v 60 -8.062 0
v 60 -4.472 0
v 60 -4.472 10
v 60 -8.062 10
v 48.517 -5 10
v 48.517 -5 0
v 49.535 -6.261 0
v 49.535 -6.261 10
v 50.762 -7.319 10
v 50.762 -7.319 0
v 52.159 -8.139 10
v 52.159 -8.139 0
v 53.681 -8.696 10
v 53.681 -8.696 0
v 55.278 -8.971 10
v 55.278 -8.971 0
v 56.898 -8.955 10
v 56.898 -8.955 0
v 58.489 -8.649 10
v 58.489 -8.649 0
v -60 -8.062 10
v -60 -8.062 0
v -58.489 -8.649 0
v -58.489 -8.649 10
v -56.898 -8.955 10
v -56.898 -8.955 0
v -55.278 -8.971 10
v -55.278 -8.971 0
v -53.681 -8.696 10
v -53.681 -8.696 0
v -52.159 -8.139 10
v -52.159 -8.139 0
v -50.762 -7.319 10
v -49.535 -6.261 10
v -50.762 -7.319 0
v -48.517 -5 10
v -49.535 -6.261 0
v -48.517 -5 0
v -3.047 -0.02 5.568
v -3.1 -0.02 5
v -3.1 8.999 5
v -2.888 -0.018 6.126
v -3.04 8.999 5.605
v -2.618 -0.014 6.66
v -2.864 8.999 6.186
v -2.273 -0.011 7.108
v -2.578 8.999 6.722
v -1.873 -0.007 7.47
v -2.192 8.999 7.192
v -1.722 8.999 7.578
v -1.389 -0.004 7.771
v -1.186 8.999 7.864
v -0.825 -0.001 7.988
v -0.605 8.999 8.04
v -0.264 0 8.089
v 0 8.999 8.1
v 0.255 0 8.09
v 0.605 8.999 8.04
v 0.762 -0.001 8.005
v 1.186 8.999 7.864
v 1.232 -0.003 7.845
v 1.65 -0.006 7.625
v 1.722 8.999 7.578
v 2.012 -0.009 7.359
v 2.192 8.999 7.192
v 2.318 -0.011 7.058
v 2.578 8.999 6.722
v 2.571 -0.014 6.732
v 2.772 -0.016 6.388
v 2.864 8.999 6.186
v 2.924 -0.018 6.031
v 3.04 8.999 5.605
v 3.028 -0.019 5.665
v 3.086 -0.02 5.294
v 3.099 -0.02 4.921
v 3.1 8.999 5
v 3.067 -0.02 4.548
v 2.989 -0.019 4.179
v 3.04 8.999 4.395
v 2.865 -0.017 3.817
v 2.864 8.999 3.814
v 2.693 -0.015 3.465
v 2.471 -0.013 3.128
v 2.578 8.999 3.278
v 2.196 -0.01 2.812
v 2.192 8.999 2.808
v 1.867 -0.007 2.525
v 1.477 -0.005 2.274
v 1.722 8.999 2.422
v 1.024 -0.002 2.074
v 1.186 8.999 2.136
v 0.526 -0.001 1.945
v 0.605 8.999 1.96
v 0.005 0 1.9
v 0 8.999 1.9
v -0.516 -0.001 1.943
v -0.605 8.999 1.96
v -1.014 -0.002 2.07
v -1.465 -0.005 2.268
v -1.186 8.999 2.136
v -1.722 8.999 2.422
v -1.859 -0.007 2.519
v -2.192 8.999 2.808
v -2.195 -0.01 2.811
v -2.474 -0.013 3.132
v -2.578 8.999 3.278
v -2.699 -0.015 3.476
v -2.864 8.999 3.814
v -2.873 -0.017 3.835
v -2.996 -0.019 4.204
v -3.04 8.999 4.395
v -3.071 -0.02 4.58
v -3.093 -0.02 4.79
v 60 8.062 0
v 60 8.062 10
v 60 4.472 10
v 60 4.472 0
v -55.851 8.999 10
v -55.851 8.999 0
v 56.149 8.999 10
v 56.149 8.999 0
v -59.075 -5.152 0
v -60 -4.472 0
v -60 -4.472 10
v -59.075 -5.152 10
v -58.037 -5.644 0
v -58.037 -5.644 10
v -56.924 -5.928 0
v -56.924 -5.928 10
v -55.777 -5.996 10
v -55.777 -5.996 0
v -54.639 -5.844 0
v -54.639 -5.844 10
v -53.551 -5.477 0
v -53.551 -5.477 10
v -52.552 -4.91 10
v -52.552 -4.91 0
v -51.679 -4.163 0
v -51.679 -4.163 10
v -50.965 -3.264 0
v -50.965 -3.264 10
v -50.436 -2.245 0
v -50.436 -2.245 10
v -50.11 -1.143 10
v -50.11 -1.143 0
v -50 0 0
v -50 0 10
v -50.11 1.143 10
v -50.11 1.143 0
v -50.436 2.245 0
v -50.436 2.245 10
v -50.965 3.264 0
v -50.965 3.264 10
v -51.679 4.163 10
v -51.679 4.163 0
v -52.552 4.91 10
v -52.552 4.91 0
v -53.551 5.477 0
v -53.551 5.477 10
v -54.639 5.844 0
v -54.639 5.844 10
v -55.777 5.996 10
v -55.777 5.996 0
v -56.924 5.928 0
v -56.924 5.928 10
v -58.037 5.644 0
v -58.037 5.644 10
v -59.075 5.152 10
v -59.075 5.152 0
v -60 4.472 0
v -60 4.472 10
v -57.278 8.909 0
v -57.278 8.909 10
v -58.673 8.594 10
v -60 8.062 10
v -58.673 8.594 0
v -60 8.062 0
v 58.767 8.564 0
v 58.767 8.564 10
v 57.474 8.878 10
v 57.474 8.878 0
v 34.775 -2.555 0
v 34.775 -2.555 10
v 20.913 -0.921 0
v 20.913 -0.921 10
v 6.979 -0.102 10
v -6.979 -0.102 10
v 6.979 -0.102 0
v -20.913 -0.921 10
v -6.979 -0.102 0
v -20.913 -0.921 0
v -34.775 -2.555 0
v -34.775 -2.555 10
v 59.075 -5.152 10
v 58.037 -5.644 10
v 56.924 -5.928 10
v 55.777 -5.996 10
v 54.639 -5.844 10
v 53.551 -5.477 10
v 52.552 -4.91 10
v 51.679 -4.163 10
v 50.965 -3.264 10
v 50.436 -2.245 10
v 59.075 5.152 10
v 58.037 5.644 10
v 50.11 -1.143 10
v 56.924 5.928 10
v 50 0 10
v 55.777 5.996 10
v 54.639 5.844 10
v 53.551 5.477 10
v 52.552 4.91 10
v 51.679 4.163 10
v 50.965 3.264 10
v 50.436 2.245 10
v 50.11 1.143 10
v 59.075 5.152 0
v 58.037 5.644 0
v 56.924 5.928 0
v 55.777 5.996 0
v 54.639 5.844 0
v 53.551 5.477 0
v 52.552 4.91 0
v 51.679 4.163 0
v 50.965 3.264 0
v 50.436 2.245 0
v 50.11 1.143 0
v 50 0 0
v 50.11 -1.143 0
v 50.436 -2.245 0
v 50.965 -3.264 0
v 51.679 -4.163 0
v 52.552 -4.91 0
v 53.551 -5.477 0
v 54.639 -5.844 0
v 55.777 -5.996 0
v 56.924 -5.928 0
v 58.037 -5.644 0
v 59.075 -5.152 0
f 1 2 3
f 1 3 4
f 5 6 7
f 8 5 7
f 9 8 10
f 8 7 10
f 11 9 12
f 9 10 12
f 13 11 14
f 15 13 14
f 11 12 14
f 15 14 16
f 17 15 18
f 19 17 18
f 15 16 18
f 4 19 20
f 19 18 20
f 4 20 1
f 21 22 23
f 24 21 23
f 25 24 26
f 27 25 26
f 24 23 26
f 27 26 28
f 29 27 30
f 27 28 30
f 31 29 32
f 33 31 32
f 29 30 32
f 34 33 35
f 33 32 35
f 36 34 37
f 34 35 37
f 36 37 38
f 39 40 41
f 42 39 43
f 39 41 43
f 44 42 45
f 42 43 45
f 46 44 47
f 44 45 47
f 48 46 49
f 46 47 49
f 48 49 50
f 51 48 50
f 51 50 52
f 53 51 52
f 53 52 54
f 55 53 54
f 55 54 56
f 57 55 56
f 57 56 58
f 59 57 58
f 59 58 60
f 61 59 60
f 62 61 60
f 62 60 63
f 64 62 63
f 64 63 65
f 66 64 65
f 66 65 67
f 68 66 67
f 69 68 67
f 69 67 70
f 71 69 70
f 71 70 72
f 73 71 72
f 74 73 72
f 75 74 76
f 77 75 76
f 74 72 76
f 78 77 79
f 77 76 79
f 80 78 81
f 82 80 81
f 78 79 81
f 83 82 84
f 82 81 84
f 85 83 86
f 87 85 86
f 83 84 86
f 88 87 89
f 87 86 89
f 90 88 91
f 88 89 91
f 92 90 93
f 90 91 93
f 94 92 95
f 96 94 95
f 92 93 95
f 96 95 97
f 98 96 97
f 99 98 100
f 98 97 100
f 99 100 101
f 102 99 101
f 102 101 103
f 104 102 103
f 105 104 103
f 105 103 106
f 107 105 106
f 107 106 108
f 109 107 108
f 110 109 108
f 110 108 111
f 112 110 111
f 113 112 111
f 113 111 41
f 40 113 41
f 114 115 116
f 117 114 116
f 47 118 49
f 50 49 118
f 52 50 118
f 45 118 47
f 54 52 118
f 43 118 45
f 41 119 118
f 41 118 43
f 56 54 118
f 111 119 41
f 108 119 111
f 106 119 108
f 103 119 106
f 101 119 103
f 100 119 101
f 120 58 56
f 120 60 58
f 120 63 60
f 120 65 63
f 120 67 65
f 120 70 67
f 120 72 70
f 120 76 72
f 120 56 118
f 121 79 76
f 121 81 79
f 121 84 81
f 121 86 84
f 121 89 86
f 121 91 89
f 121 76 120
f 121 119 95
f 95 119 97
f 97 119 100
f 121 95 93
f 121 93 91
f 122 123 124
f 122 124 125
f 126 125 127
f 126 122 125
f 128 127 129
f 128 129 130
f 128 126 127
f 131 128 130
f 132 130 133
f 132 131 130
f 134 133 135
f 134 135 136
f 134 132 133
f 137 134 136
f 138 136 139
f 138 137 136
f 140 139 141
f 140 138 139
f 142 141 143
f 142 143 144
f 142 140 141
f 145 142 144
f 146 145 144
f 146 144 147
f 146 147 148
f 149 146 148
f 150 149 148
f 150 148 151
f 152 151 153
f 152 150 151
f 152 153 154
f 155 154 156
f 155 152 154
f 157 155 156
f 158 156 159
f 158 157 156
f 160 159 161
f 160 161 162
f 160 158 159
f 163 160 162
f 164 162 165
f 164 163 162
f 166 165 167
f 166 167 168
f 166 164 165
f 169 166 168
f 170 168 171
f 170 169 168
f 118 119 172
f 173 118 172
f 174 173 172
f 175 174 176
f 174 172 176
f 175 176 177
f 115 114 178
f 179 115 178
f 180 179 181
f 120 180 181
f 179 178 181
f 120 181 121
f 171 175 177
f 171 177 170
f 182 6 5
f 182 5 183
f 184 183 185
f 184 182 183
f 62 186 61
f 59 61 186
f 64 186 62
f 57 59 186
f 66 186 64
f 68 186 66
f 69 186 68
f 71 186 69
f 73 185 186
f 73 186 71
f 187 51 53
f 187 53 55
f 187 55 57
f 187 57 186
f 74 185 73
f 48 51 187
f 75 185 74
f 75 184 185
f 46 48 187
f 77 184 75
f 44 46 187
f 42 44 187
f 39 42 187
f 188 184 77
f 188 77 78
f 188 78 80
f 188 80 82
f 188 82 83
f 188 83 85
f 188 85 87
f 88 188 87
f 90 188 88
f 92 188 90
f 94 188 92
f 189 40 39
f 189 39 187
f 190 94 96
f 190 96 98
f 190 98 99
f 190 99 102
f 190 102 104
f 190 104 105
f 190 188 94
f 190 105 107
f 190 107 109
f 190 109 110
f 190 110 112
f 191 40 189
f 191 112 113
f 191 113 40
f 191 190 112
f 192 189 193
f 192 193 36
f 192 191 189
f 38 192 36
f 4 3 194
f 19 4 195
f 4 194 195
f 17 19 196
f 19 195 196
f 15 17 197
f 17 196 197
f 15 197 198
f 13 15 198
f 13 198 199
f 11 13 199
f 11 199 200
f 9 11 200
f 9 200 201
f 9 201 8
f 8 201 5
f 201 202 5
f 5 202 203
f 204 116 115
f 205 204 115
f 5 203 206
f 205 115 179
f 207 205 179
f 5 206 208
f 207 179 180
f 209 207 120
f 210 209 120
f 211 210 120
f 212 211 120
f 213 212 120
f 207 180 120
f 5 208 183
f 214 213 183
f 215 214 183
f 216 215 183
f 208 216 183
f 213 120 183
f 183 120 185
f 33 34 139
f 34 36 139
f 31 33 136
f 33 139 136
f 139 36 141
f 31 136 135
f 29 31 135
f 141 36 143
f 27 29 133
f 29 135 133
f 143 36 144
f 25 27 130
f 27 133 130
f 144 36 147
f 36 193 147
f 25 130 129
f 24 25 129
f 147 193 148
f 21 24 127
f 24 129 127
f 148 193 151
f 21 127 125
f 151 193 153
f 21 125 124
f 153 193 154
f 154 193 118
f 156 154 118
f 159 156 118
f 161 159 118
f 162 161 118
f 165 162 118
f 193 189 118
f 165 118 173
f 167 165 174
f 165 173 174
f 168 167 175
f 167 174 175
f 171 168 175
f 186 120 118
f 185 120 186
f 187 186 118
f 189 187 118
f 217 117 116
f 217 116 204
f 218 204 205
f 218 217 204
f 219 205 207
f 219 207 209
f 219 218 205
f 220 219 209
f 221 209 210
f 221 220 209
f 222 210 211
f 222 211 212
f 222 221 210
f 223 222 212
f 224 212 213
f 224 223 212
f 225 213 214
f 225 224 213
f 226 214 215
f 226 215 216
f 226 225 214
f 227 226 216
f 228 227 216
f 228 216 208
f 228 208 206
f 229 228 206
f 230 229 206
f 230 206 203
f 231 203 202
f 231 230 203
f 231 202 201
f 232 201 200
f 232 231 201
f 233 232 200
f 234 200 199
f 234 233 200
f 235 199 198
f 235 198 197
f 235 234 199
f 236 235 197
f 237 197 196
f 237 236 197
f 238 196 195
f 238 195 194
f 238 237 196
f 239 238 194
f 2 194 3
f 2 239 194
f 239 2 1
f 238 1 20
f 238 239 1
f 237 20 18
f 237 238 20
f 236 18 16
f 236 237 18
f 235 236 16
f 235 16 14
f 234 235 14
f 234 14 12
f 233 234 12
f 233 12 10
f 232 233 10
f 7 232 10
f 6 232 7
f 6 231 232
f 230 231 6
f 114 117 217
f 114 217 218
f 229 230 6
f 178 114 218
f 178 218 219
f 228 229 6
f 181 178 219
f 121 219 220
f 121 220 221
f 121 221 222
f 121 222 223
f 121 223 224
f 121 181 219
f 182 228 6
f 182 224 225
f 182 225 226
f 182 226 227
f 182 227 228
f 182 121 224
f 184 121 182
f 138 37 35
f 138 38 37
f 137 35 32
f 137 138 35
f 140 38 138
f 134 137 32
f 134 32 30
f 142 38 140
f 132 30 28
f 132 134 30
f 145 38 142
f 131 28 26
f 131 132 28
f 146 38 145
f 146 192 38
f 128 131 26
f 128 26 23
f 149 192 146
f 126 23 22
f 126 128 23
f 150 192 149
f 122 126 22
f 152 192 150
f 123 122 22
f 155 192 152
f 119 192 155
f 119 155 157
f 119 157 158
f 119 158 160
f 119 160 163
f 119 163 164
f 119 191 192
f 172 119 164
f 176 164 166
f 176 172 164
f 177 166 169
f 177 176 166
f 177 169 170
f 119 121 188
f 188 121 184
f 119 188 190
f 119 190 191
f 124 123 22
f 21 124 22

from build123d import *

# Parameters (mm, degrees)
PAD_DEPTH    = 10
SKETCH001_R  = 3.1
POCKET_DEPTH = 17.999765


with BuildPart() as part:
    # Sketch → Pad (new body)
    with BuildSketch(Plane.XY):
        with BuildLine():
            ThreePointArc((-60, -4.472136), (-50, 0), (-60, 4.472136))
            Line((-60, 8.062258), (-60, 4.472136))
            ThreePointArc((-55.850927, 8.998765), (-57.981583, 8.779142), (-60, 8.062258))
            Line((-55.850927, 8.998765), (56.149073, 8.998765))
            ThreePointArc((60, 8.062258), (58.126726, 8.745115), (56.149073, 8.998765))
            Line((60, 8.062258), (60, 4.472136))
            ThreePointArc((60, 4.472136), (50, 0), (60, -4.472136))
            Line((60, -4.472136), (60, -8.062258))
            ThreePointArc((48.516685, -5), (53.681008, -8.696107), (60, -8.062258))
            ThreePointArc((48.516685, -5), (0, 0), (-48.516685, -5))
            ThreePointArc((-60, -8.062258), (-53.681008, -8.696107), (-48.516685, -5))
            Line((-60, -4.472136), (-60, -8.062258))
        make_face()
    extrude(amount=PAD_DEPTH)

    # Sketch001 (on Face4 of Pad) → Pocket (cut, through all)
    with BuildSketch(Plane(origin=(0, 8.998765, 0), x_dir=(-1, 0, 0), z_dir=(0, 1, 0))):
        with Locations((0, 5)):
            Circle(SKETCH001_R)
    extrude(amount=-POCKET_DEPTH, mode=Mode.SUBTRACT)


solid = part.part
